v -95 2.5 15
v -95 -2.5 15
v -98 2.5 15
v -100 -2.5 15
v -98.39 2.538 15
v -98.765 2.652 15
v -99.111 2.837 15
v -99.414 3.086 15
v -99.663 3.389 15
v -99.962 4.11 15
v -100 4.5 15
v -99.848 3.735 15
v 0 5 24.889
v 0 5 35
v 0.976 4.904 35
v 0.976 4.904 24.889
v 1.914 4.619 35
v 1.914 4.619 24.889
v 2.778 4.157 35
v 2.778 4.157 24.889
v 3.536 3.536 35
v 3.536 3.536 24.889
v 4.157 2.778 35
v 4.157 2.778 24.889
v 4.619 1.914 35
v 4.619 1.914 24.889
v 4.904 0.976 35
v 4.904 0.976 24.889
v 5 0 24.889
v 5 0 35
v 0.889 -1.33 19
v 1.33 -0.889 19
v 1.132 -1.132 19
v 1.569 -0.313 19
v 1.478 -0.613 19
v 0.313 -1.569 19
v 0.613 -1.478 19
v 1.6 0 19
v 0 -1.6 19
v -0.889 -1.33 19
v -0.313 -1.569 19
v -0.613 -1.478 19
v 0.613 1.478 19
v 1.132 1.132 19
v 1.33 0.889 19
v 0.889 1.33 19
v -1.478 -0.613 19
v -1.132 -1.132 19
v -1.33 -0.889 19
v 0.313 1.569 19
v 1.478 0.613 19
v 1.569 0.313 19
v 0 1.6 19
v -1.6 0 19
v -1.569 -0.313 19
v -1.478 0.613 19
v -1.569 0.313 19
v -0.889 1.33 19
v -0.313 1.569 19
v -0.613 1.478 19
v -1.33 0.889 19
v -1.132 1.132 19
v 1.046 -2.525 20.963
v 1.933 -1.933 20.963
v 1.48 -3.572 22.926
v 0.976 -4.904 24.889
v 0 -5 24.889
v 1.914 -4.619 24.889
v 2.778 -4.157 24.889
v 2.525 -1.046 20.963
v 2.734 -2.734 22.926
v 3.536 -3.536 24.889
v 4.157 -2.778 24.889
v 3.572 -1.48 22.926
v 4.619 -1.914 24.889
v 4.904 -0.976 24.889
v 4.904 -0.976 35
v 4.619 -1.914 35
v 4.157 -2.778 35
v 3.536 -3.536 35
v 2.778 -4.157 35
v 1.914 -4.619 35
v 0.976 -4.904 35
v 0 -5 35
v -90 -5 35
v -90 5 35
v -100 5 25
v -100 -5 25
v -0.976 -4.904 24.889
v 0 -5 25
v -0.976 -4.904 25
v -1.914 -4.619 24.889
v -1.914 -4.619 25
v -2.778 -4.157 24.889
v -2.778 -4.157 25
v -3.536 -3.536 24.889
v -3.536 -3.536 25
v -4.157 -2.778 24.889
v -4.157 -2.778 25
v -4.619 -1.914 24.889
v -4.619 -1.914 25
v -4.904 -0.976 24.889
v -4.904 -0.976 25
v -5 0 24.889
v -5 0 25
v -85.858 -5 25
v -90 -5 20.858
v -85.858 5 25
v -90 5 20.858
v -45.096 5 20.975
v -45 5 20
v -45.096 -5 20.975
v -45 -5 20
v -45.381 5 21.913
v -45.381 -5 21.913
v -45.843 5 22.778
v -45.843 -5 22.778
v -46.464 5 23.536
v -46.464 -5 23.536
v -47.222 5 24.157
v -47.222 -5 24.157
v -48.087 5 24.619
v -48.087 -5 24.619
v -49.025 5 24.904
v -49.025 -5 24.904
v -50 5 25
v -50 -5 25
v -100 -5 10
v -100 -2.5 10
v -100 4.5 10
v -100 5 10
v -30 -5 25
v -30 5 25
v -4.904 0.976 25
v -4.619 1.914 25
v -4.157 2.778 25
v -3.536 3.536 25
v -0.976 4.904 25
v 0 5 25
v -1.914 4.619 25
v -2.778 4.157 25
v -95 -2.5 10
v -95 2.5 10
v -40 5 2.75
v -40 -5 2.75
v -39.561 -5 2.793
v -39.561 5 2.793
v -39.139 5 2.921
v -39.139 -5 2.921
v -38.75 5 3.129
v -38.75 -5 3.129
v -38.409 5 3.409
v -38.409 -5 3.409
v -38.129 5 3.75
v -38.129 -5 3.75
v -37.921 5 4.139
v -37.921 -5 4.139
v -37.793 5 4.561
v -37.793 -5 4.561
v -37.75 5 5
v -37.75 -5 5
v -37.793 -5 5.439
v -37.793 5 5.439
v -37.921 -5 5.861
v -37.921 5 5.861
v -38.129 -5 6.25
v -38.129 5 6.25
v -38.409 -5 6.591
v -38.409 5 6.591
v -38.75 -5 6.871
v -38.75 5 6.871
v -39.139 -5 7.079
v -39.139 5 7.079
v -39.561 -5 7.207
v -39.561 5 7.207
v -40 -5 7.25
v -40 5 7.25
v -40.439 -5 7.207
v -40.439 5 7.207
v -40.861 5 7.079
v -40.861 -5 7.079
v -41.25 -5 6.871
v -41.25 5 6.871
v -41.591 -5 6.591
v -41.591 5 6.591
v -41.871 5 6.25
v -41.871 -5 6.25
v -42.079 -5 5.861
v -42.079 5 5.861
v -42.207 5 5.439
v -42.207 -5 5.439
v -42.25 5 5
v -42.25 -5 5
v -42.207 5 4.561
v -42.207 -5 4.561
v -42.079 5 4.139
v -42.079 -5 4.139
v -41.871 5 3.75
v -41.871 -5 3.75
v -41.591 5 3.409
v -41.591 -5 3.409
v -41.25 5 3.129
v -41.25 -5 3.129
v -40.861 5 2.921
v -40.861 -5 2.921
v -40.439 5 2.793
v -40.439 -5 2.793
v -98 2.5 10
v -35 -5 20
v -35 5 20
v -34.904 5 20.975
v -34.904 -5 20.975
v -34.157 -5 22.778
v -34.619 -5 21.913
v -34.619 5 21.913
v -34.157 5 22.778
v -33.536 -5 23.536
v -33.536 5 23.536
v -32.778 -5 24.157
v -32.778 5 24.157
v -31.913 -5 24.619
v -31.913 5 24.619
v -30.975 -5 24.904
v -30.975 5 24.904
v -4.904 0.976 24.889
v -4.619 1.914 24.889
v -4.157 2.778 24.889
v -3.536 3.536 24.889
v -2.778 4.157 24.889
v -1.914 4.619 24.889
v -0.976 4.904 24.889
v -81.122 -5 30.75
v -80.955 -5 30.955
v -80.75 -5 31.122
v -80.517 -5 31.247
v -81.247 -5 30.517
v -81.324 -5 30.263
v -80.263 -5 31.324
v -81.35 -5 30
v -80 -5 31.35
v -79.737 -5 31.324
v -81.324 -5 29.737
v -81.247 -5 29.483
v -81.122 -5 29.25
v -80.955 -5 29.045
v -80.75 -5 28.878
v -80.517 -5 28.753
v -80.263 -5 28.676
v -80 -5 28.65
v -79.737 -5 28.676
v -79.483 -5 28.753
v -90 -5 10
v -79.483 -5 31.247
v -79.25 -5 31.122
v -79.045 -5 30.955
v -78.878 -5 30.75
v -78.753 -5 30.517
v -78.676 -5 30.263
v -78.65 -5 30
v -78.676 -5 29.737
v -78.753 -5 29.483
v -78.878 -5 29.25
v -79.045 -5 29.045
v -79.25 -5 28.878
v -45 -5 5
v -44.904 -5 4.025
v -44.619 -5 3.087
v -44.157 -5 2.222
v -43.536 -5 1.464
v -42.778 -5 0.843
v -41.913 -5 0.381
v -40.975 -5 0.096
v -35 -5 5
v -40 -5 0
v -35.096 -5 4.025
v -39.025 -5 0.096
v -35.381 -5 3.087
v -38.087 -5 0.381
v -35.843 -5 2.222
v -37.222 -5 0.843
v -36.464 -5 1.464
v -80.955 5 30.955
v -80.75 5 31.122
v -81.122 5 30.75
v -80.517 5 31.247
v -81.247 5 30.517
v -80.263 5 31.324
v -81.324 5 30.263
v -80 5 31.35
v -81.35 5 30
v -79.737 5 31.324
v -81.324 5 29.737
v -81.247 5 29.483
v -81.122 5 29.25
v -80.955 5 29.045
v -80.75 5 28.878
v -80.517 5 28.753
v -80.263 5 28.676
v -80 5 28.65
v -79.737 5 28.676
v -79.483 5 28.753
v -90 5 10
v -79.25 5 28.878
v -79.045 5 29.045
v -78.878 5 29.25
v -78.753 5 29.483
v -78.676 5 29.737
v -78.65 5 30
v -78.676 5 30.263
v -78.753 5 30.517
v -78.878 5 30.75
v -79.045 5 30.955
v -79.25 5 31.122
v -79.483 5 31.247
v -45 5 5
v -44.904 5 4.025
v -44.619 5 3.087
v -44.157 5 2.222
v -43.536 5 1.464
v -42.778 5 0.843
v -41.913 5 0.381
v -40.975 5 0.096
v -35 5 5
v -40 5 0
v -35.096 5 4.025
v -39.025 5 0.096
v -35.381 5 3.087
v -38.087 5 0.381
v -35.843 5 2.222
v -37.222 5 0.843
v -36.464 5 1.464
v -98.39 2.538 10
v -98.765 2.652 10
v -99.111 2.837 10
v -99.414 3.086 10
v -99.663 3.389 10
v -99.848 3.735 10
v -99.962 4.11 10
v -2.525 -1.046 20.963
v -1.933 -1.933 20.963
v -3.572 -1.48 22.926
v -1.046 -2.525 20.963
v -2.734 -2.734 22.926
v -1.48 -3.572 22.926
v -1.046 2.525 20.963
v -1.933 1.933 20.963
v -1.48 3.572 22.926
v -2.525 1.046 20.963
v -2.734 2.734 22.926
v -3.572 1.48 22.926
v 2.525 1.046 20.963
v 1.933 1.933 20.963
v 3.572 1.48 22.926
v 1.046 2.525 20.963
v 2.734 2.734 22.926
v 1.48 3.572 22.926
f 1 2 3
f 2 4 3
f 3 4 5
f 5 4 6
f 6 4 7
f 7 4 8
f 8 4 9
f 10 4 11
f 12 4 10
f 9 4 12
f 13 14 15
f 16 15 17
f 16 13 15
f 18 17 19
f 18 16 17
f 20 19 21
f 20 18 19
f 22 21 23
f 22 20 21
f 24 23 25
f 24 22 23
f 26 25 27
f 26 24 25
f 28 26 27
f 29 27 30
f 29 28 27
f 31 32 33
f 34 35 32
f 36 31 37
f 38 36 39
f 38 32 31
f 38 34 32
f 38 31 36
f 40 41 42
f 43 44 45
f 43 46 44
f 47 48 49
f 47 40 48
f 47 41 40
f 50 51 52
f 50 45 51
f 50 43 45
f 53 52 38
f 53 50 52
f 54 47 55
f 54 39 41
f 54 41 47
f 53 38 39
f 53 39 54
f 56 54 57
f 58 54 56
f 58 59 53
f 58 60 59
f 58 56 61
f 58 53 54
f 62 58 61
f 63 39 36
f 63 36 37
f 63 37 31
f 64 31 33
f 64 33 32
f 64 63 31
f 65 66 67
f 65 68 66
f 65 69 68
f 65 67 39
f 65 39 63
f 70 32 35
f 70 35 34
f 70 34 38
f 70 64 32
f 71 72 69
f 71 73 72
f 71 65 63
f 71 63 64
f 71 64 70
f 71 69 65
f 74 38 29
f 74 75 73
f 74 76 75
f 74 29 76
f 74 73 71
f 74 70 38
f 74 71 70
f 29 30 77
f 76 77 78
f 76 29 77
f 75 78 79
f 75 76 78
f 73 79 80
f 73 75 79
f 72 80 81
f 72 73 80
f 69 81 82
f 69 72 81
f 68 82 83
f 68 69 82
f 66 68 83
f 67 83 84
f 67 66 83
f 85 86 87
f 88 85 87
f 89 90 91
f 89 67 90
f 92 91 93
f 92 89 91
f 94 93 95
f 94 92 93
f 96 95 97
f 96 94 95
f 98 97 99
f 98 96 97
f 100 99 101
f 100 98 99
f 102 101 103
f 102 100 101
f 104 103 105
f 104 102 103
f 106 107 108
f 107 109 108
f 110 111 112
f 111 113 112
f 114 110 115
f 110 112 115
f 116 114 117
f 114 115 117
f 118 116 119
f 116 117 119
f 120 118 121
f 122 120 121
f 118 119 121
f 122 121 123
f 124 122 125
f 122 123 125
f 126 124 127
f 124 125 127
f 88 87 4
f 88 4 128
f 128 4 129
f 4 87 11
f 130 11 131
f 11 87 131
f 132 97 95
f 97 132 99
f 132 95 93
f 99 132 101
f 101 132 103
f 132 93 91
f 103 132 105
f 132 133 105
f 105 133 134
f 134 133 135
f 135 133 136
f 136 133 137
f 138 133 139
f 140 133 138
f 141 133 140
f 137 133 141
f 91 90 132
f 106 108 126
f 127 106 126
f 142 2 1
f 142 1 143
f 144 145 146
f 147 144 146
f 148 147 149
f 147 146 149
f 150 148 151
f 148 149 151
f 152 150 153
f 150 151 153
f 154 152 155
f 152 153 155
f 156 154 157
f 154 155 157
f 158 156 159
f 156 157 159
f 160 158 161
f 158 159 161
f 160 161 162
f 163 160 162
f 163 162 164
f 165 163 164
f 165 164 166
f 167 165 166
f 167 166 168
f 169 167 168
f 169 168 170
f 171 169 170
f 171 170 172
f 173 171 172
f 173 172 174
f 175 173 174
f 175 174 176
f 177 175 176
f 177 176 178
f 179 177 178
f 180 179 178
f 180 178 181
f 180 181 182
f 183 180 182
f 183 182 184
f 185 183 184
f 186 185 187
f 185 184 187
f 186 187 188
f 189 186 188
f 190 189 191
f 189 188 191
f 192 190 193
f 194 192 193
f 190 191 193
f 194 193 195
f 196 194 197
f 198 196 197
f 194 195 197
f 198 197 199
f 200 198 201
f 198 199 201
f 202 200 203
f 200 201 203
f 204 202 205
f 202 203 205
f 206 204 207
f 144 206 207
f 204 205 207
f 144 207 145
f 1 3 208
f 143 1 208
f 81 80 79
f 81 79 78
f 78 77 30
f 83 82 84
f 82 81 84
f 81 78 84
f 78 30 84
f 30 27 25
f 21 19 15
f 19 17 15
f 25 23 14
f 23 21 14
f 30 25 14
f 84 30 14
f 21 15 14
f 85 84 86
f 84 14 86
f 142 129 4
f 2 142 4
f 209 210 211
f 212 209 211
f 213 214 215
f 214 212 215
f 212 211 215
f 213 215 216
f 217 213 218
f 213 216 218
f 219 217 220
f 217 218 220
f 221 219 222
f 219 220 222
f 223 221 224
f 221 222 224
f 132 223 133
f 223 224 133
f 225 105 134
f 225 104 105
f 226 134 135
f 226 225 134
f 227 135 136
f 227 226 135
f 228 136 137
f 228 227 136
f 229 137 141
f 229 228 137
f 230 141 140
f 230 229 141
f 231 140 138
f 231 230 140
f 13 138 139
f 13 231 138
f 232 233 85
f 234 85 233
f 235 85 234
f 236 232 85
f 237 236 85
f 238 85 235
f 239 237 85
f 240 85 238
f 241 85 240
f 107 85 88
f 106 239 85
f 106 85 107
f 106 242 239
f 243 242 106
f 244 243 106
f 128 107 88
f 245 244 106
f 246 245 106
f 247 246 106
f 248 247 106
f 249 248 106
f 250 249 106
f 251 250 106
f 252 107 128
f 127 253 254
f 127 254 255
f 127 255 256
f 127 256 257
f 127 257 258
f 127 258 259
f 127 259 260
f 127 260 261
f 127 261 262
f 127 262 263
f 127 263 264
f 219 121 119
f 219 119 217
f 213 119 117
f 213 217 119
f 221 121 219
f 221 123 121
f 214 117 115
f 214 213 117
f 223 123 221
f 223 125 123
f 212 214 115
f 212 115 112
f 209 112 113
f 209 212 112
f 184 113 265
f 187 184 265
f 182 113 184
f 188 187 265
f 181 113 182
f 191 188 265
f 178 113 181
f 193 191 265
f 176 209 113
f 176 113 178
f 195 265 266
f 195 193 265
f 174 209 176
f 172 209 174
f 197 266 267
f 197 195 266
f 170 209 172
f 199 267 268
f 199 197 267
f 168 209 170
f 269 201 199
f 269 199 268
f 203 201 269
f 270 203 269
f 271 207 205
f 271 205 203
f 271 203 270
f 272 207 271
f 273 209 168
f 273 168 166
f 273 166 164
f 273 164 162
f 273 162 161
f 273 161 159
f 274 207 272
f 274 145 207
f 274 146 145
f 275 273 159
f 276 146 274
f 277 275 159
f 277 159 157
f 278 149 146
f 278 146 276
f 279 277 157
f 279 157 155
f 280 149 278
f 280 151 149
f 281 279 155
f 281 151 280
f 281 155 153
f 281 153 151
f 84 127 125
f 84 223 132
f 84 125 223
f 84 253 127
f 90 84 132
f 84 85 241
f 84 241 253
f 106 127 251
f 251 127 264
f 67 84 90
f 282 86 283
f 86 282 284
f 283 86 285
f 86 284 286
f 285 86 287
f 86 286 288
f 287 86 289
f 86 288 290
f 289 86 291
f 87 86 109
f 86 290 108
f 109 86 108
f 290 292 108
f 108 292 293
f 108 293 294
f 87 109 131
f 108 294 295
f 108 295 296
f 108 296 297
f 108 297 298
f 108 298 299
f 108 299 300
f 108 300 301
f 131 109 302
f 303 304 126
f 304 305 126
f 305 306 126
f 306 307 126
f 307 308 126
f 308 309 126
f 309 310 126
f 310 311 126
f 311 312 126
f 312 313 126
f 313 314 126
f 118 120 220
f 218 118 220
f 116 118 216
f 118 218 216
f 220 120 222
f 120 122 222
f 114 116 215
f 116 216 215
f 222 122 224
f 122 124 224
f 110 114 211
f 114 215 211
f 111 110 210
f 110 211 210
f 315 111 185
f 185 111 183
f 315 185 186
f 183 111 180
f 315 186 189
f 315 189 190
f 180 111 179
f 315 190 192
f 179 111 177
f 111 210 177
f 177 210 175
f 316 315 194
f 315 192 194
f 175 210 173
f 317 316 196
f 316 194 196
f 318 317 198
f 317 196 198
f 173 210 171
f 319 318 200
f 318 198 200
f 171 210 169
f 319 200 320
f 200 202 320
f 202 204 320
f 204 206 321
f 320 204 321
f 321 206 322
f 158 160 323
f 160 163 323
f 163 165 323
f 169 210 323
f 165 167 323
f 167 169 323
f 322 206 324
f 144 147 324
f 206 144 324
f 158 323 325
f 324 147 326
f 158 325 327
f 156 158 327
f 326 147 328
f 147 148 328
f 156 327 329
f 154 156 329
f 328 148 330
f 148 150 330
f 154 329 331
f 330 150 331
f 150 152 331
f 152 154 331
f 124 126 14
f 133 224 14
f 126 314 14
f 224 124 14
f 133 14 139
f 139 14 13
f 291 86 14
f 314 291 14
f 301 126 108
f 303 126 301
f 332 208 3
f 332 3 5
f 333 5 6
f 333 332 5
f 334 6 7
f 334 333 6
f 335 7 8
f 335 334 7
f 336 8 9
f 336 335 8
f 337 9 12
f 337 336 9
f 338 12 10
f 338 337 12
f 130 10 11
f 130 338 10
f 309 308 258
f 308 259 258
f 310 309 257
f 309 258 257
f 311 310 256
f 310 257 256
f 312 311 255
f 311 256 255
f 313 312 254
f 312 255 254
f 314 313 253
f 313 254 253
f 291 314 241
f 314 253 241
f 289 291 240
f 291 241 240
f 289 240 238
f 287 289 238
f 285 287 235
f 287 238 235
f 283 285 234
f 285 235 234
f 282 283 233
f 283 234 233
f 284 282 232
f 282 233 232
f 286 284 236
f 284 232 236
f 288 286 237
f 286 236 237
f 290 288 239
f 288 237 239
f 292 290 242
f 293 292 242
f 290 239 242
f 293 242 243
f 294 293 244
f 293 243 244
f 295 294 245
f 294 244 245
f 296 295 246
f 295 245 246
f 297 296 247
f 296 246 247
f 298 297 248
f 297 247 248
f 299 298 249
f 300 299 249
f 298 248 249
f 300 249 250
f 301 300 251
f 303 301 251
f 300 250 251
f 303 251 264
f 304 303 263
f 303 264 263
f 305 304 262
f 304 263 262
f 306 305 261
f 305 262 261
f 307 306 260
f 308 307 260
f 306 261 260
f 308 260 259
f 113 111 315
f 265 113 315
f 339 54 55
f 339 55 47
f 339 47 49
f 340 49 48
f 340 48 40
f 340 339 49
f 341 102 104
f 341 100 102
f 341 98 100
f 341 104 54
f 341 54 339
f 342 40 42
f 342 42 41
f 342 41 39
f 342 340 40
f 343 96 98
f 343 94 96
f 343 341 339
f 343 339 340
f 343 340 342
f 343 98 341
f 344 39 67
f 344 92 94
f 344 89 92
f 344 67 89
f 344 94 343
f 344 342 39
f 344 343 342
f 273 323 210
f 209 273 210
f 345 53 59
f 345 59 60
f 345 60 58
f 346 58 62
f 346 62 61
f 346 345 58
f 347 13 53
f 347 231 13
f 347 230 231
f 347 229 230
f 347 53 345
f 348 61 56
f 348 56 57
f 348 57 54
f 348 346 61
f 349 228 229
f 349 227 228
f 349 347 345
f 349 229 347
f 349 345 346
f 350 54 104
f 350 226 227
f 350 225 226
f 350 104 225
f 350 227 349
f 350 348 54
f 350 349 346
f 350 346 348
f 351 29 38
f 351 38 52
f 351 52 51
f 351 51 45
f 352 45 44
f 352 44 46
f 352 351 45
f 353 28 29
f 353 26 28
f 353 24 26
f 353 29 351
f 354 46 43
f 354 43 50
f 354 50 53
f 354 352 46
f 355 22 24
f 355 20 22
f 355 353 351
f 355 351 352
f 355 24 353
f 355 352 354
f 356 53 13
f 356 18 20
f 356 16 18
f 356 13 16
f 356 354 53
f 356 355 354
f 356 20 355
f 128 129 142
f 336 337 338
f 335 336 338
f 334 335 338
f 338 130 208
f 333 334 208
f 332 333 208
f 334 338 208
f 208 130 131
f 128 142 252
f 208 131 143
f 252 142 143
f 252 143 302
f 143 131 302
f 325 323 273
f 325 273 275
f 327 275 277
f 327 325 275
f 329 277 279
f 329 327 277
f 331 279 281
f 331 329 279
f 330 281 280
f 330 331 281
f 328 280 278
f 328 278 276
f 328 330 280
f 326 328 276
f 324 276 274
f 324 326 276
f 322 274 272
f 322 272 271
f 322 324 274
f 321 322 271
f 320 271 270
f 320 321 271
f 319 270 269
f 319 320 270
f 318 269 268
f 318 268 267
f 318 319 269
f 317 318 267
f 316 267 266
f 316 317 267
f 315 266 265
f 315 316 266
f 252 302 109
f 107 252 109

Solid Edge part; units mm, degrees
sketch "Sketch1" plane through (0, 0, 0) normal (0, -1, 0) x (1, 0, 0)
  line L0 (-5, 25) -> (-5, 19)
  line L1 (5, 19) -> (-5, 19)
  line L2 (5, 35) -> (5, 19)
  line L3 (5, 35) -> (-90, 35)
  line L4 (-90, 35) -> (-100, 25)
  line L5 (-100, 25) -> (-100, 10)
  line L6 (-100, 10) -> (-90, 10)
  line L7 (-90, 10) -> (-90, 20.8579)
  line L8 (-90, 20.8579) -> (-85.8579, 25)
  line L9 (-85.8579, 25) -> (-45, 25)
  line L10 (-45, 25) -> (-45, 5)
  arc A0 (-35, 5) -> (-45, 5) centre (-40, 5) cw
  line L11 (-35, 5) -> (-35, 25)
  line L12 (-35, 25) -> (-5, 25)
  dimension "D1" = 10
  dimension "D2" = 10
  dimension "D3" = 10
  dimension "D4" = 10
  dimension "D5" = 100
  dimension "D6" = 19
  dimension "D7" = 30
  dimension "D8" = 10
  dimension "D9" = 5
extrude "Protrusion1" add sketch "Sketch1" along normal mid plane 10
fillet "Round_1" radius 5 4 edges at (-5, -5, 22) (-5, 5, 22) (5, 5, 27) (5, -5, 27)
sketch "Sketch2" plane through (0, 0, 0) normal (0, -1, 0) x (1, 0, 0)
  circle A0 centre (-80, 30) radius 1.35
  dimension "D1" = 30
  dimension "D2" = 80
extrude "ExtrudedCutout_3" cut sketch "Sketch2" along normal mid plane 29.2691
sketch "Sketch3" plane through (-100, 0, 15) normal (-1, 0, 0) x (0, 0, -1)
  line L0 (5, 2.5) -> (0, 2.5)
  line L1 (0, 2.5) -> (0, -2.5)
  line L2 (0, -2.5) -> (5, -2.5)
  line L3 (5, -2.5) -> (5, 2.5)
  dimension "D1" = 5
  dimension "D2" = 5
extrude "ExtrudedCutout_4" cut sketch "Sketch3" against normal blind 5
fillet "Round_6" radius 2 1 edges at (-100, 2.5, 12.5)
hole "Hole_1" at (-40, -5, 5) direction (0, 1, 0) diameter 4.5 end up to next
fillet "Round_7" radius 5 2 edges at (-45, 0, 25) (-35, 0, 25)
chamfer "Chamfer_4" distance 3.4 angle 60 1 edges at (-5, 0, 19) measured on face at (3.4333, -3.2333, 19)
properties material "PVC"
